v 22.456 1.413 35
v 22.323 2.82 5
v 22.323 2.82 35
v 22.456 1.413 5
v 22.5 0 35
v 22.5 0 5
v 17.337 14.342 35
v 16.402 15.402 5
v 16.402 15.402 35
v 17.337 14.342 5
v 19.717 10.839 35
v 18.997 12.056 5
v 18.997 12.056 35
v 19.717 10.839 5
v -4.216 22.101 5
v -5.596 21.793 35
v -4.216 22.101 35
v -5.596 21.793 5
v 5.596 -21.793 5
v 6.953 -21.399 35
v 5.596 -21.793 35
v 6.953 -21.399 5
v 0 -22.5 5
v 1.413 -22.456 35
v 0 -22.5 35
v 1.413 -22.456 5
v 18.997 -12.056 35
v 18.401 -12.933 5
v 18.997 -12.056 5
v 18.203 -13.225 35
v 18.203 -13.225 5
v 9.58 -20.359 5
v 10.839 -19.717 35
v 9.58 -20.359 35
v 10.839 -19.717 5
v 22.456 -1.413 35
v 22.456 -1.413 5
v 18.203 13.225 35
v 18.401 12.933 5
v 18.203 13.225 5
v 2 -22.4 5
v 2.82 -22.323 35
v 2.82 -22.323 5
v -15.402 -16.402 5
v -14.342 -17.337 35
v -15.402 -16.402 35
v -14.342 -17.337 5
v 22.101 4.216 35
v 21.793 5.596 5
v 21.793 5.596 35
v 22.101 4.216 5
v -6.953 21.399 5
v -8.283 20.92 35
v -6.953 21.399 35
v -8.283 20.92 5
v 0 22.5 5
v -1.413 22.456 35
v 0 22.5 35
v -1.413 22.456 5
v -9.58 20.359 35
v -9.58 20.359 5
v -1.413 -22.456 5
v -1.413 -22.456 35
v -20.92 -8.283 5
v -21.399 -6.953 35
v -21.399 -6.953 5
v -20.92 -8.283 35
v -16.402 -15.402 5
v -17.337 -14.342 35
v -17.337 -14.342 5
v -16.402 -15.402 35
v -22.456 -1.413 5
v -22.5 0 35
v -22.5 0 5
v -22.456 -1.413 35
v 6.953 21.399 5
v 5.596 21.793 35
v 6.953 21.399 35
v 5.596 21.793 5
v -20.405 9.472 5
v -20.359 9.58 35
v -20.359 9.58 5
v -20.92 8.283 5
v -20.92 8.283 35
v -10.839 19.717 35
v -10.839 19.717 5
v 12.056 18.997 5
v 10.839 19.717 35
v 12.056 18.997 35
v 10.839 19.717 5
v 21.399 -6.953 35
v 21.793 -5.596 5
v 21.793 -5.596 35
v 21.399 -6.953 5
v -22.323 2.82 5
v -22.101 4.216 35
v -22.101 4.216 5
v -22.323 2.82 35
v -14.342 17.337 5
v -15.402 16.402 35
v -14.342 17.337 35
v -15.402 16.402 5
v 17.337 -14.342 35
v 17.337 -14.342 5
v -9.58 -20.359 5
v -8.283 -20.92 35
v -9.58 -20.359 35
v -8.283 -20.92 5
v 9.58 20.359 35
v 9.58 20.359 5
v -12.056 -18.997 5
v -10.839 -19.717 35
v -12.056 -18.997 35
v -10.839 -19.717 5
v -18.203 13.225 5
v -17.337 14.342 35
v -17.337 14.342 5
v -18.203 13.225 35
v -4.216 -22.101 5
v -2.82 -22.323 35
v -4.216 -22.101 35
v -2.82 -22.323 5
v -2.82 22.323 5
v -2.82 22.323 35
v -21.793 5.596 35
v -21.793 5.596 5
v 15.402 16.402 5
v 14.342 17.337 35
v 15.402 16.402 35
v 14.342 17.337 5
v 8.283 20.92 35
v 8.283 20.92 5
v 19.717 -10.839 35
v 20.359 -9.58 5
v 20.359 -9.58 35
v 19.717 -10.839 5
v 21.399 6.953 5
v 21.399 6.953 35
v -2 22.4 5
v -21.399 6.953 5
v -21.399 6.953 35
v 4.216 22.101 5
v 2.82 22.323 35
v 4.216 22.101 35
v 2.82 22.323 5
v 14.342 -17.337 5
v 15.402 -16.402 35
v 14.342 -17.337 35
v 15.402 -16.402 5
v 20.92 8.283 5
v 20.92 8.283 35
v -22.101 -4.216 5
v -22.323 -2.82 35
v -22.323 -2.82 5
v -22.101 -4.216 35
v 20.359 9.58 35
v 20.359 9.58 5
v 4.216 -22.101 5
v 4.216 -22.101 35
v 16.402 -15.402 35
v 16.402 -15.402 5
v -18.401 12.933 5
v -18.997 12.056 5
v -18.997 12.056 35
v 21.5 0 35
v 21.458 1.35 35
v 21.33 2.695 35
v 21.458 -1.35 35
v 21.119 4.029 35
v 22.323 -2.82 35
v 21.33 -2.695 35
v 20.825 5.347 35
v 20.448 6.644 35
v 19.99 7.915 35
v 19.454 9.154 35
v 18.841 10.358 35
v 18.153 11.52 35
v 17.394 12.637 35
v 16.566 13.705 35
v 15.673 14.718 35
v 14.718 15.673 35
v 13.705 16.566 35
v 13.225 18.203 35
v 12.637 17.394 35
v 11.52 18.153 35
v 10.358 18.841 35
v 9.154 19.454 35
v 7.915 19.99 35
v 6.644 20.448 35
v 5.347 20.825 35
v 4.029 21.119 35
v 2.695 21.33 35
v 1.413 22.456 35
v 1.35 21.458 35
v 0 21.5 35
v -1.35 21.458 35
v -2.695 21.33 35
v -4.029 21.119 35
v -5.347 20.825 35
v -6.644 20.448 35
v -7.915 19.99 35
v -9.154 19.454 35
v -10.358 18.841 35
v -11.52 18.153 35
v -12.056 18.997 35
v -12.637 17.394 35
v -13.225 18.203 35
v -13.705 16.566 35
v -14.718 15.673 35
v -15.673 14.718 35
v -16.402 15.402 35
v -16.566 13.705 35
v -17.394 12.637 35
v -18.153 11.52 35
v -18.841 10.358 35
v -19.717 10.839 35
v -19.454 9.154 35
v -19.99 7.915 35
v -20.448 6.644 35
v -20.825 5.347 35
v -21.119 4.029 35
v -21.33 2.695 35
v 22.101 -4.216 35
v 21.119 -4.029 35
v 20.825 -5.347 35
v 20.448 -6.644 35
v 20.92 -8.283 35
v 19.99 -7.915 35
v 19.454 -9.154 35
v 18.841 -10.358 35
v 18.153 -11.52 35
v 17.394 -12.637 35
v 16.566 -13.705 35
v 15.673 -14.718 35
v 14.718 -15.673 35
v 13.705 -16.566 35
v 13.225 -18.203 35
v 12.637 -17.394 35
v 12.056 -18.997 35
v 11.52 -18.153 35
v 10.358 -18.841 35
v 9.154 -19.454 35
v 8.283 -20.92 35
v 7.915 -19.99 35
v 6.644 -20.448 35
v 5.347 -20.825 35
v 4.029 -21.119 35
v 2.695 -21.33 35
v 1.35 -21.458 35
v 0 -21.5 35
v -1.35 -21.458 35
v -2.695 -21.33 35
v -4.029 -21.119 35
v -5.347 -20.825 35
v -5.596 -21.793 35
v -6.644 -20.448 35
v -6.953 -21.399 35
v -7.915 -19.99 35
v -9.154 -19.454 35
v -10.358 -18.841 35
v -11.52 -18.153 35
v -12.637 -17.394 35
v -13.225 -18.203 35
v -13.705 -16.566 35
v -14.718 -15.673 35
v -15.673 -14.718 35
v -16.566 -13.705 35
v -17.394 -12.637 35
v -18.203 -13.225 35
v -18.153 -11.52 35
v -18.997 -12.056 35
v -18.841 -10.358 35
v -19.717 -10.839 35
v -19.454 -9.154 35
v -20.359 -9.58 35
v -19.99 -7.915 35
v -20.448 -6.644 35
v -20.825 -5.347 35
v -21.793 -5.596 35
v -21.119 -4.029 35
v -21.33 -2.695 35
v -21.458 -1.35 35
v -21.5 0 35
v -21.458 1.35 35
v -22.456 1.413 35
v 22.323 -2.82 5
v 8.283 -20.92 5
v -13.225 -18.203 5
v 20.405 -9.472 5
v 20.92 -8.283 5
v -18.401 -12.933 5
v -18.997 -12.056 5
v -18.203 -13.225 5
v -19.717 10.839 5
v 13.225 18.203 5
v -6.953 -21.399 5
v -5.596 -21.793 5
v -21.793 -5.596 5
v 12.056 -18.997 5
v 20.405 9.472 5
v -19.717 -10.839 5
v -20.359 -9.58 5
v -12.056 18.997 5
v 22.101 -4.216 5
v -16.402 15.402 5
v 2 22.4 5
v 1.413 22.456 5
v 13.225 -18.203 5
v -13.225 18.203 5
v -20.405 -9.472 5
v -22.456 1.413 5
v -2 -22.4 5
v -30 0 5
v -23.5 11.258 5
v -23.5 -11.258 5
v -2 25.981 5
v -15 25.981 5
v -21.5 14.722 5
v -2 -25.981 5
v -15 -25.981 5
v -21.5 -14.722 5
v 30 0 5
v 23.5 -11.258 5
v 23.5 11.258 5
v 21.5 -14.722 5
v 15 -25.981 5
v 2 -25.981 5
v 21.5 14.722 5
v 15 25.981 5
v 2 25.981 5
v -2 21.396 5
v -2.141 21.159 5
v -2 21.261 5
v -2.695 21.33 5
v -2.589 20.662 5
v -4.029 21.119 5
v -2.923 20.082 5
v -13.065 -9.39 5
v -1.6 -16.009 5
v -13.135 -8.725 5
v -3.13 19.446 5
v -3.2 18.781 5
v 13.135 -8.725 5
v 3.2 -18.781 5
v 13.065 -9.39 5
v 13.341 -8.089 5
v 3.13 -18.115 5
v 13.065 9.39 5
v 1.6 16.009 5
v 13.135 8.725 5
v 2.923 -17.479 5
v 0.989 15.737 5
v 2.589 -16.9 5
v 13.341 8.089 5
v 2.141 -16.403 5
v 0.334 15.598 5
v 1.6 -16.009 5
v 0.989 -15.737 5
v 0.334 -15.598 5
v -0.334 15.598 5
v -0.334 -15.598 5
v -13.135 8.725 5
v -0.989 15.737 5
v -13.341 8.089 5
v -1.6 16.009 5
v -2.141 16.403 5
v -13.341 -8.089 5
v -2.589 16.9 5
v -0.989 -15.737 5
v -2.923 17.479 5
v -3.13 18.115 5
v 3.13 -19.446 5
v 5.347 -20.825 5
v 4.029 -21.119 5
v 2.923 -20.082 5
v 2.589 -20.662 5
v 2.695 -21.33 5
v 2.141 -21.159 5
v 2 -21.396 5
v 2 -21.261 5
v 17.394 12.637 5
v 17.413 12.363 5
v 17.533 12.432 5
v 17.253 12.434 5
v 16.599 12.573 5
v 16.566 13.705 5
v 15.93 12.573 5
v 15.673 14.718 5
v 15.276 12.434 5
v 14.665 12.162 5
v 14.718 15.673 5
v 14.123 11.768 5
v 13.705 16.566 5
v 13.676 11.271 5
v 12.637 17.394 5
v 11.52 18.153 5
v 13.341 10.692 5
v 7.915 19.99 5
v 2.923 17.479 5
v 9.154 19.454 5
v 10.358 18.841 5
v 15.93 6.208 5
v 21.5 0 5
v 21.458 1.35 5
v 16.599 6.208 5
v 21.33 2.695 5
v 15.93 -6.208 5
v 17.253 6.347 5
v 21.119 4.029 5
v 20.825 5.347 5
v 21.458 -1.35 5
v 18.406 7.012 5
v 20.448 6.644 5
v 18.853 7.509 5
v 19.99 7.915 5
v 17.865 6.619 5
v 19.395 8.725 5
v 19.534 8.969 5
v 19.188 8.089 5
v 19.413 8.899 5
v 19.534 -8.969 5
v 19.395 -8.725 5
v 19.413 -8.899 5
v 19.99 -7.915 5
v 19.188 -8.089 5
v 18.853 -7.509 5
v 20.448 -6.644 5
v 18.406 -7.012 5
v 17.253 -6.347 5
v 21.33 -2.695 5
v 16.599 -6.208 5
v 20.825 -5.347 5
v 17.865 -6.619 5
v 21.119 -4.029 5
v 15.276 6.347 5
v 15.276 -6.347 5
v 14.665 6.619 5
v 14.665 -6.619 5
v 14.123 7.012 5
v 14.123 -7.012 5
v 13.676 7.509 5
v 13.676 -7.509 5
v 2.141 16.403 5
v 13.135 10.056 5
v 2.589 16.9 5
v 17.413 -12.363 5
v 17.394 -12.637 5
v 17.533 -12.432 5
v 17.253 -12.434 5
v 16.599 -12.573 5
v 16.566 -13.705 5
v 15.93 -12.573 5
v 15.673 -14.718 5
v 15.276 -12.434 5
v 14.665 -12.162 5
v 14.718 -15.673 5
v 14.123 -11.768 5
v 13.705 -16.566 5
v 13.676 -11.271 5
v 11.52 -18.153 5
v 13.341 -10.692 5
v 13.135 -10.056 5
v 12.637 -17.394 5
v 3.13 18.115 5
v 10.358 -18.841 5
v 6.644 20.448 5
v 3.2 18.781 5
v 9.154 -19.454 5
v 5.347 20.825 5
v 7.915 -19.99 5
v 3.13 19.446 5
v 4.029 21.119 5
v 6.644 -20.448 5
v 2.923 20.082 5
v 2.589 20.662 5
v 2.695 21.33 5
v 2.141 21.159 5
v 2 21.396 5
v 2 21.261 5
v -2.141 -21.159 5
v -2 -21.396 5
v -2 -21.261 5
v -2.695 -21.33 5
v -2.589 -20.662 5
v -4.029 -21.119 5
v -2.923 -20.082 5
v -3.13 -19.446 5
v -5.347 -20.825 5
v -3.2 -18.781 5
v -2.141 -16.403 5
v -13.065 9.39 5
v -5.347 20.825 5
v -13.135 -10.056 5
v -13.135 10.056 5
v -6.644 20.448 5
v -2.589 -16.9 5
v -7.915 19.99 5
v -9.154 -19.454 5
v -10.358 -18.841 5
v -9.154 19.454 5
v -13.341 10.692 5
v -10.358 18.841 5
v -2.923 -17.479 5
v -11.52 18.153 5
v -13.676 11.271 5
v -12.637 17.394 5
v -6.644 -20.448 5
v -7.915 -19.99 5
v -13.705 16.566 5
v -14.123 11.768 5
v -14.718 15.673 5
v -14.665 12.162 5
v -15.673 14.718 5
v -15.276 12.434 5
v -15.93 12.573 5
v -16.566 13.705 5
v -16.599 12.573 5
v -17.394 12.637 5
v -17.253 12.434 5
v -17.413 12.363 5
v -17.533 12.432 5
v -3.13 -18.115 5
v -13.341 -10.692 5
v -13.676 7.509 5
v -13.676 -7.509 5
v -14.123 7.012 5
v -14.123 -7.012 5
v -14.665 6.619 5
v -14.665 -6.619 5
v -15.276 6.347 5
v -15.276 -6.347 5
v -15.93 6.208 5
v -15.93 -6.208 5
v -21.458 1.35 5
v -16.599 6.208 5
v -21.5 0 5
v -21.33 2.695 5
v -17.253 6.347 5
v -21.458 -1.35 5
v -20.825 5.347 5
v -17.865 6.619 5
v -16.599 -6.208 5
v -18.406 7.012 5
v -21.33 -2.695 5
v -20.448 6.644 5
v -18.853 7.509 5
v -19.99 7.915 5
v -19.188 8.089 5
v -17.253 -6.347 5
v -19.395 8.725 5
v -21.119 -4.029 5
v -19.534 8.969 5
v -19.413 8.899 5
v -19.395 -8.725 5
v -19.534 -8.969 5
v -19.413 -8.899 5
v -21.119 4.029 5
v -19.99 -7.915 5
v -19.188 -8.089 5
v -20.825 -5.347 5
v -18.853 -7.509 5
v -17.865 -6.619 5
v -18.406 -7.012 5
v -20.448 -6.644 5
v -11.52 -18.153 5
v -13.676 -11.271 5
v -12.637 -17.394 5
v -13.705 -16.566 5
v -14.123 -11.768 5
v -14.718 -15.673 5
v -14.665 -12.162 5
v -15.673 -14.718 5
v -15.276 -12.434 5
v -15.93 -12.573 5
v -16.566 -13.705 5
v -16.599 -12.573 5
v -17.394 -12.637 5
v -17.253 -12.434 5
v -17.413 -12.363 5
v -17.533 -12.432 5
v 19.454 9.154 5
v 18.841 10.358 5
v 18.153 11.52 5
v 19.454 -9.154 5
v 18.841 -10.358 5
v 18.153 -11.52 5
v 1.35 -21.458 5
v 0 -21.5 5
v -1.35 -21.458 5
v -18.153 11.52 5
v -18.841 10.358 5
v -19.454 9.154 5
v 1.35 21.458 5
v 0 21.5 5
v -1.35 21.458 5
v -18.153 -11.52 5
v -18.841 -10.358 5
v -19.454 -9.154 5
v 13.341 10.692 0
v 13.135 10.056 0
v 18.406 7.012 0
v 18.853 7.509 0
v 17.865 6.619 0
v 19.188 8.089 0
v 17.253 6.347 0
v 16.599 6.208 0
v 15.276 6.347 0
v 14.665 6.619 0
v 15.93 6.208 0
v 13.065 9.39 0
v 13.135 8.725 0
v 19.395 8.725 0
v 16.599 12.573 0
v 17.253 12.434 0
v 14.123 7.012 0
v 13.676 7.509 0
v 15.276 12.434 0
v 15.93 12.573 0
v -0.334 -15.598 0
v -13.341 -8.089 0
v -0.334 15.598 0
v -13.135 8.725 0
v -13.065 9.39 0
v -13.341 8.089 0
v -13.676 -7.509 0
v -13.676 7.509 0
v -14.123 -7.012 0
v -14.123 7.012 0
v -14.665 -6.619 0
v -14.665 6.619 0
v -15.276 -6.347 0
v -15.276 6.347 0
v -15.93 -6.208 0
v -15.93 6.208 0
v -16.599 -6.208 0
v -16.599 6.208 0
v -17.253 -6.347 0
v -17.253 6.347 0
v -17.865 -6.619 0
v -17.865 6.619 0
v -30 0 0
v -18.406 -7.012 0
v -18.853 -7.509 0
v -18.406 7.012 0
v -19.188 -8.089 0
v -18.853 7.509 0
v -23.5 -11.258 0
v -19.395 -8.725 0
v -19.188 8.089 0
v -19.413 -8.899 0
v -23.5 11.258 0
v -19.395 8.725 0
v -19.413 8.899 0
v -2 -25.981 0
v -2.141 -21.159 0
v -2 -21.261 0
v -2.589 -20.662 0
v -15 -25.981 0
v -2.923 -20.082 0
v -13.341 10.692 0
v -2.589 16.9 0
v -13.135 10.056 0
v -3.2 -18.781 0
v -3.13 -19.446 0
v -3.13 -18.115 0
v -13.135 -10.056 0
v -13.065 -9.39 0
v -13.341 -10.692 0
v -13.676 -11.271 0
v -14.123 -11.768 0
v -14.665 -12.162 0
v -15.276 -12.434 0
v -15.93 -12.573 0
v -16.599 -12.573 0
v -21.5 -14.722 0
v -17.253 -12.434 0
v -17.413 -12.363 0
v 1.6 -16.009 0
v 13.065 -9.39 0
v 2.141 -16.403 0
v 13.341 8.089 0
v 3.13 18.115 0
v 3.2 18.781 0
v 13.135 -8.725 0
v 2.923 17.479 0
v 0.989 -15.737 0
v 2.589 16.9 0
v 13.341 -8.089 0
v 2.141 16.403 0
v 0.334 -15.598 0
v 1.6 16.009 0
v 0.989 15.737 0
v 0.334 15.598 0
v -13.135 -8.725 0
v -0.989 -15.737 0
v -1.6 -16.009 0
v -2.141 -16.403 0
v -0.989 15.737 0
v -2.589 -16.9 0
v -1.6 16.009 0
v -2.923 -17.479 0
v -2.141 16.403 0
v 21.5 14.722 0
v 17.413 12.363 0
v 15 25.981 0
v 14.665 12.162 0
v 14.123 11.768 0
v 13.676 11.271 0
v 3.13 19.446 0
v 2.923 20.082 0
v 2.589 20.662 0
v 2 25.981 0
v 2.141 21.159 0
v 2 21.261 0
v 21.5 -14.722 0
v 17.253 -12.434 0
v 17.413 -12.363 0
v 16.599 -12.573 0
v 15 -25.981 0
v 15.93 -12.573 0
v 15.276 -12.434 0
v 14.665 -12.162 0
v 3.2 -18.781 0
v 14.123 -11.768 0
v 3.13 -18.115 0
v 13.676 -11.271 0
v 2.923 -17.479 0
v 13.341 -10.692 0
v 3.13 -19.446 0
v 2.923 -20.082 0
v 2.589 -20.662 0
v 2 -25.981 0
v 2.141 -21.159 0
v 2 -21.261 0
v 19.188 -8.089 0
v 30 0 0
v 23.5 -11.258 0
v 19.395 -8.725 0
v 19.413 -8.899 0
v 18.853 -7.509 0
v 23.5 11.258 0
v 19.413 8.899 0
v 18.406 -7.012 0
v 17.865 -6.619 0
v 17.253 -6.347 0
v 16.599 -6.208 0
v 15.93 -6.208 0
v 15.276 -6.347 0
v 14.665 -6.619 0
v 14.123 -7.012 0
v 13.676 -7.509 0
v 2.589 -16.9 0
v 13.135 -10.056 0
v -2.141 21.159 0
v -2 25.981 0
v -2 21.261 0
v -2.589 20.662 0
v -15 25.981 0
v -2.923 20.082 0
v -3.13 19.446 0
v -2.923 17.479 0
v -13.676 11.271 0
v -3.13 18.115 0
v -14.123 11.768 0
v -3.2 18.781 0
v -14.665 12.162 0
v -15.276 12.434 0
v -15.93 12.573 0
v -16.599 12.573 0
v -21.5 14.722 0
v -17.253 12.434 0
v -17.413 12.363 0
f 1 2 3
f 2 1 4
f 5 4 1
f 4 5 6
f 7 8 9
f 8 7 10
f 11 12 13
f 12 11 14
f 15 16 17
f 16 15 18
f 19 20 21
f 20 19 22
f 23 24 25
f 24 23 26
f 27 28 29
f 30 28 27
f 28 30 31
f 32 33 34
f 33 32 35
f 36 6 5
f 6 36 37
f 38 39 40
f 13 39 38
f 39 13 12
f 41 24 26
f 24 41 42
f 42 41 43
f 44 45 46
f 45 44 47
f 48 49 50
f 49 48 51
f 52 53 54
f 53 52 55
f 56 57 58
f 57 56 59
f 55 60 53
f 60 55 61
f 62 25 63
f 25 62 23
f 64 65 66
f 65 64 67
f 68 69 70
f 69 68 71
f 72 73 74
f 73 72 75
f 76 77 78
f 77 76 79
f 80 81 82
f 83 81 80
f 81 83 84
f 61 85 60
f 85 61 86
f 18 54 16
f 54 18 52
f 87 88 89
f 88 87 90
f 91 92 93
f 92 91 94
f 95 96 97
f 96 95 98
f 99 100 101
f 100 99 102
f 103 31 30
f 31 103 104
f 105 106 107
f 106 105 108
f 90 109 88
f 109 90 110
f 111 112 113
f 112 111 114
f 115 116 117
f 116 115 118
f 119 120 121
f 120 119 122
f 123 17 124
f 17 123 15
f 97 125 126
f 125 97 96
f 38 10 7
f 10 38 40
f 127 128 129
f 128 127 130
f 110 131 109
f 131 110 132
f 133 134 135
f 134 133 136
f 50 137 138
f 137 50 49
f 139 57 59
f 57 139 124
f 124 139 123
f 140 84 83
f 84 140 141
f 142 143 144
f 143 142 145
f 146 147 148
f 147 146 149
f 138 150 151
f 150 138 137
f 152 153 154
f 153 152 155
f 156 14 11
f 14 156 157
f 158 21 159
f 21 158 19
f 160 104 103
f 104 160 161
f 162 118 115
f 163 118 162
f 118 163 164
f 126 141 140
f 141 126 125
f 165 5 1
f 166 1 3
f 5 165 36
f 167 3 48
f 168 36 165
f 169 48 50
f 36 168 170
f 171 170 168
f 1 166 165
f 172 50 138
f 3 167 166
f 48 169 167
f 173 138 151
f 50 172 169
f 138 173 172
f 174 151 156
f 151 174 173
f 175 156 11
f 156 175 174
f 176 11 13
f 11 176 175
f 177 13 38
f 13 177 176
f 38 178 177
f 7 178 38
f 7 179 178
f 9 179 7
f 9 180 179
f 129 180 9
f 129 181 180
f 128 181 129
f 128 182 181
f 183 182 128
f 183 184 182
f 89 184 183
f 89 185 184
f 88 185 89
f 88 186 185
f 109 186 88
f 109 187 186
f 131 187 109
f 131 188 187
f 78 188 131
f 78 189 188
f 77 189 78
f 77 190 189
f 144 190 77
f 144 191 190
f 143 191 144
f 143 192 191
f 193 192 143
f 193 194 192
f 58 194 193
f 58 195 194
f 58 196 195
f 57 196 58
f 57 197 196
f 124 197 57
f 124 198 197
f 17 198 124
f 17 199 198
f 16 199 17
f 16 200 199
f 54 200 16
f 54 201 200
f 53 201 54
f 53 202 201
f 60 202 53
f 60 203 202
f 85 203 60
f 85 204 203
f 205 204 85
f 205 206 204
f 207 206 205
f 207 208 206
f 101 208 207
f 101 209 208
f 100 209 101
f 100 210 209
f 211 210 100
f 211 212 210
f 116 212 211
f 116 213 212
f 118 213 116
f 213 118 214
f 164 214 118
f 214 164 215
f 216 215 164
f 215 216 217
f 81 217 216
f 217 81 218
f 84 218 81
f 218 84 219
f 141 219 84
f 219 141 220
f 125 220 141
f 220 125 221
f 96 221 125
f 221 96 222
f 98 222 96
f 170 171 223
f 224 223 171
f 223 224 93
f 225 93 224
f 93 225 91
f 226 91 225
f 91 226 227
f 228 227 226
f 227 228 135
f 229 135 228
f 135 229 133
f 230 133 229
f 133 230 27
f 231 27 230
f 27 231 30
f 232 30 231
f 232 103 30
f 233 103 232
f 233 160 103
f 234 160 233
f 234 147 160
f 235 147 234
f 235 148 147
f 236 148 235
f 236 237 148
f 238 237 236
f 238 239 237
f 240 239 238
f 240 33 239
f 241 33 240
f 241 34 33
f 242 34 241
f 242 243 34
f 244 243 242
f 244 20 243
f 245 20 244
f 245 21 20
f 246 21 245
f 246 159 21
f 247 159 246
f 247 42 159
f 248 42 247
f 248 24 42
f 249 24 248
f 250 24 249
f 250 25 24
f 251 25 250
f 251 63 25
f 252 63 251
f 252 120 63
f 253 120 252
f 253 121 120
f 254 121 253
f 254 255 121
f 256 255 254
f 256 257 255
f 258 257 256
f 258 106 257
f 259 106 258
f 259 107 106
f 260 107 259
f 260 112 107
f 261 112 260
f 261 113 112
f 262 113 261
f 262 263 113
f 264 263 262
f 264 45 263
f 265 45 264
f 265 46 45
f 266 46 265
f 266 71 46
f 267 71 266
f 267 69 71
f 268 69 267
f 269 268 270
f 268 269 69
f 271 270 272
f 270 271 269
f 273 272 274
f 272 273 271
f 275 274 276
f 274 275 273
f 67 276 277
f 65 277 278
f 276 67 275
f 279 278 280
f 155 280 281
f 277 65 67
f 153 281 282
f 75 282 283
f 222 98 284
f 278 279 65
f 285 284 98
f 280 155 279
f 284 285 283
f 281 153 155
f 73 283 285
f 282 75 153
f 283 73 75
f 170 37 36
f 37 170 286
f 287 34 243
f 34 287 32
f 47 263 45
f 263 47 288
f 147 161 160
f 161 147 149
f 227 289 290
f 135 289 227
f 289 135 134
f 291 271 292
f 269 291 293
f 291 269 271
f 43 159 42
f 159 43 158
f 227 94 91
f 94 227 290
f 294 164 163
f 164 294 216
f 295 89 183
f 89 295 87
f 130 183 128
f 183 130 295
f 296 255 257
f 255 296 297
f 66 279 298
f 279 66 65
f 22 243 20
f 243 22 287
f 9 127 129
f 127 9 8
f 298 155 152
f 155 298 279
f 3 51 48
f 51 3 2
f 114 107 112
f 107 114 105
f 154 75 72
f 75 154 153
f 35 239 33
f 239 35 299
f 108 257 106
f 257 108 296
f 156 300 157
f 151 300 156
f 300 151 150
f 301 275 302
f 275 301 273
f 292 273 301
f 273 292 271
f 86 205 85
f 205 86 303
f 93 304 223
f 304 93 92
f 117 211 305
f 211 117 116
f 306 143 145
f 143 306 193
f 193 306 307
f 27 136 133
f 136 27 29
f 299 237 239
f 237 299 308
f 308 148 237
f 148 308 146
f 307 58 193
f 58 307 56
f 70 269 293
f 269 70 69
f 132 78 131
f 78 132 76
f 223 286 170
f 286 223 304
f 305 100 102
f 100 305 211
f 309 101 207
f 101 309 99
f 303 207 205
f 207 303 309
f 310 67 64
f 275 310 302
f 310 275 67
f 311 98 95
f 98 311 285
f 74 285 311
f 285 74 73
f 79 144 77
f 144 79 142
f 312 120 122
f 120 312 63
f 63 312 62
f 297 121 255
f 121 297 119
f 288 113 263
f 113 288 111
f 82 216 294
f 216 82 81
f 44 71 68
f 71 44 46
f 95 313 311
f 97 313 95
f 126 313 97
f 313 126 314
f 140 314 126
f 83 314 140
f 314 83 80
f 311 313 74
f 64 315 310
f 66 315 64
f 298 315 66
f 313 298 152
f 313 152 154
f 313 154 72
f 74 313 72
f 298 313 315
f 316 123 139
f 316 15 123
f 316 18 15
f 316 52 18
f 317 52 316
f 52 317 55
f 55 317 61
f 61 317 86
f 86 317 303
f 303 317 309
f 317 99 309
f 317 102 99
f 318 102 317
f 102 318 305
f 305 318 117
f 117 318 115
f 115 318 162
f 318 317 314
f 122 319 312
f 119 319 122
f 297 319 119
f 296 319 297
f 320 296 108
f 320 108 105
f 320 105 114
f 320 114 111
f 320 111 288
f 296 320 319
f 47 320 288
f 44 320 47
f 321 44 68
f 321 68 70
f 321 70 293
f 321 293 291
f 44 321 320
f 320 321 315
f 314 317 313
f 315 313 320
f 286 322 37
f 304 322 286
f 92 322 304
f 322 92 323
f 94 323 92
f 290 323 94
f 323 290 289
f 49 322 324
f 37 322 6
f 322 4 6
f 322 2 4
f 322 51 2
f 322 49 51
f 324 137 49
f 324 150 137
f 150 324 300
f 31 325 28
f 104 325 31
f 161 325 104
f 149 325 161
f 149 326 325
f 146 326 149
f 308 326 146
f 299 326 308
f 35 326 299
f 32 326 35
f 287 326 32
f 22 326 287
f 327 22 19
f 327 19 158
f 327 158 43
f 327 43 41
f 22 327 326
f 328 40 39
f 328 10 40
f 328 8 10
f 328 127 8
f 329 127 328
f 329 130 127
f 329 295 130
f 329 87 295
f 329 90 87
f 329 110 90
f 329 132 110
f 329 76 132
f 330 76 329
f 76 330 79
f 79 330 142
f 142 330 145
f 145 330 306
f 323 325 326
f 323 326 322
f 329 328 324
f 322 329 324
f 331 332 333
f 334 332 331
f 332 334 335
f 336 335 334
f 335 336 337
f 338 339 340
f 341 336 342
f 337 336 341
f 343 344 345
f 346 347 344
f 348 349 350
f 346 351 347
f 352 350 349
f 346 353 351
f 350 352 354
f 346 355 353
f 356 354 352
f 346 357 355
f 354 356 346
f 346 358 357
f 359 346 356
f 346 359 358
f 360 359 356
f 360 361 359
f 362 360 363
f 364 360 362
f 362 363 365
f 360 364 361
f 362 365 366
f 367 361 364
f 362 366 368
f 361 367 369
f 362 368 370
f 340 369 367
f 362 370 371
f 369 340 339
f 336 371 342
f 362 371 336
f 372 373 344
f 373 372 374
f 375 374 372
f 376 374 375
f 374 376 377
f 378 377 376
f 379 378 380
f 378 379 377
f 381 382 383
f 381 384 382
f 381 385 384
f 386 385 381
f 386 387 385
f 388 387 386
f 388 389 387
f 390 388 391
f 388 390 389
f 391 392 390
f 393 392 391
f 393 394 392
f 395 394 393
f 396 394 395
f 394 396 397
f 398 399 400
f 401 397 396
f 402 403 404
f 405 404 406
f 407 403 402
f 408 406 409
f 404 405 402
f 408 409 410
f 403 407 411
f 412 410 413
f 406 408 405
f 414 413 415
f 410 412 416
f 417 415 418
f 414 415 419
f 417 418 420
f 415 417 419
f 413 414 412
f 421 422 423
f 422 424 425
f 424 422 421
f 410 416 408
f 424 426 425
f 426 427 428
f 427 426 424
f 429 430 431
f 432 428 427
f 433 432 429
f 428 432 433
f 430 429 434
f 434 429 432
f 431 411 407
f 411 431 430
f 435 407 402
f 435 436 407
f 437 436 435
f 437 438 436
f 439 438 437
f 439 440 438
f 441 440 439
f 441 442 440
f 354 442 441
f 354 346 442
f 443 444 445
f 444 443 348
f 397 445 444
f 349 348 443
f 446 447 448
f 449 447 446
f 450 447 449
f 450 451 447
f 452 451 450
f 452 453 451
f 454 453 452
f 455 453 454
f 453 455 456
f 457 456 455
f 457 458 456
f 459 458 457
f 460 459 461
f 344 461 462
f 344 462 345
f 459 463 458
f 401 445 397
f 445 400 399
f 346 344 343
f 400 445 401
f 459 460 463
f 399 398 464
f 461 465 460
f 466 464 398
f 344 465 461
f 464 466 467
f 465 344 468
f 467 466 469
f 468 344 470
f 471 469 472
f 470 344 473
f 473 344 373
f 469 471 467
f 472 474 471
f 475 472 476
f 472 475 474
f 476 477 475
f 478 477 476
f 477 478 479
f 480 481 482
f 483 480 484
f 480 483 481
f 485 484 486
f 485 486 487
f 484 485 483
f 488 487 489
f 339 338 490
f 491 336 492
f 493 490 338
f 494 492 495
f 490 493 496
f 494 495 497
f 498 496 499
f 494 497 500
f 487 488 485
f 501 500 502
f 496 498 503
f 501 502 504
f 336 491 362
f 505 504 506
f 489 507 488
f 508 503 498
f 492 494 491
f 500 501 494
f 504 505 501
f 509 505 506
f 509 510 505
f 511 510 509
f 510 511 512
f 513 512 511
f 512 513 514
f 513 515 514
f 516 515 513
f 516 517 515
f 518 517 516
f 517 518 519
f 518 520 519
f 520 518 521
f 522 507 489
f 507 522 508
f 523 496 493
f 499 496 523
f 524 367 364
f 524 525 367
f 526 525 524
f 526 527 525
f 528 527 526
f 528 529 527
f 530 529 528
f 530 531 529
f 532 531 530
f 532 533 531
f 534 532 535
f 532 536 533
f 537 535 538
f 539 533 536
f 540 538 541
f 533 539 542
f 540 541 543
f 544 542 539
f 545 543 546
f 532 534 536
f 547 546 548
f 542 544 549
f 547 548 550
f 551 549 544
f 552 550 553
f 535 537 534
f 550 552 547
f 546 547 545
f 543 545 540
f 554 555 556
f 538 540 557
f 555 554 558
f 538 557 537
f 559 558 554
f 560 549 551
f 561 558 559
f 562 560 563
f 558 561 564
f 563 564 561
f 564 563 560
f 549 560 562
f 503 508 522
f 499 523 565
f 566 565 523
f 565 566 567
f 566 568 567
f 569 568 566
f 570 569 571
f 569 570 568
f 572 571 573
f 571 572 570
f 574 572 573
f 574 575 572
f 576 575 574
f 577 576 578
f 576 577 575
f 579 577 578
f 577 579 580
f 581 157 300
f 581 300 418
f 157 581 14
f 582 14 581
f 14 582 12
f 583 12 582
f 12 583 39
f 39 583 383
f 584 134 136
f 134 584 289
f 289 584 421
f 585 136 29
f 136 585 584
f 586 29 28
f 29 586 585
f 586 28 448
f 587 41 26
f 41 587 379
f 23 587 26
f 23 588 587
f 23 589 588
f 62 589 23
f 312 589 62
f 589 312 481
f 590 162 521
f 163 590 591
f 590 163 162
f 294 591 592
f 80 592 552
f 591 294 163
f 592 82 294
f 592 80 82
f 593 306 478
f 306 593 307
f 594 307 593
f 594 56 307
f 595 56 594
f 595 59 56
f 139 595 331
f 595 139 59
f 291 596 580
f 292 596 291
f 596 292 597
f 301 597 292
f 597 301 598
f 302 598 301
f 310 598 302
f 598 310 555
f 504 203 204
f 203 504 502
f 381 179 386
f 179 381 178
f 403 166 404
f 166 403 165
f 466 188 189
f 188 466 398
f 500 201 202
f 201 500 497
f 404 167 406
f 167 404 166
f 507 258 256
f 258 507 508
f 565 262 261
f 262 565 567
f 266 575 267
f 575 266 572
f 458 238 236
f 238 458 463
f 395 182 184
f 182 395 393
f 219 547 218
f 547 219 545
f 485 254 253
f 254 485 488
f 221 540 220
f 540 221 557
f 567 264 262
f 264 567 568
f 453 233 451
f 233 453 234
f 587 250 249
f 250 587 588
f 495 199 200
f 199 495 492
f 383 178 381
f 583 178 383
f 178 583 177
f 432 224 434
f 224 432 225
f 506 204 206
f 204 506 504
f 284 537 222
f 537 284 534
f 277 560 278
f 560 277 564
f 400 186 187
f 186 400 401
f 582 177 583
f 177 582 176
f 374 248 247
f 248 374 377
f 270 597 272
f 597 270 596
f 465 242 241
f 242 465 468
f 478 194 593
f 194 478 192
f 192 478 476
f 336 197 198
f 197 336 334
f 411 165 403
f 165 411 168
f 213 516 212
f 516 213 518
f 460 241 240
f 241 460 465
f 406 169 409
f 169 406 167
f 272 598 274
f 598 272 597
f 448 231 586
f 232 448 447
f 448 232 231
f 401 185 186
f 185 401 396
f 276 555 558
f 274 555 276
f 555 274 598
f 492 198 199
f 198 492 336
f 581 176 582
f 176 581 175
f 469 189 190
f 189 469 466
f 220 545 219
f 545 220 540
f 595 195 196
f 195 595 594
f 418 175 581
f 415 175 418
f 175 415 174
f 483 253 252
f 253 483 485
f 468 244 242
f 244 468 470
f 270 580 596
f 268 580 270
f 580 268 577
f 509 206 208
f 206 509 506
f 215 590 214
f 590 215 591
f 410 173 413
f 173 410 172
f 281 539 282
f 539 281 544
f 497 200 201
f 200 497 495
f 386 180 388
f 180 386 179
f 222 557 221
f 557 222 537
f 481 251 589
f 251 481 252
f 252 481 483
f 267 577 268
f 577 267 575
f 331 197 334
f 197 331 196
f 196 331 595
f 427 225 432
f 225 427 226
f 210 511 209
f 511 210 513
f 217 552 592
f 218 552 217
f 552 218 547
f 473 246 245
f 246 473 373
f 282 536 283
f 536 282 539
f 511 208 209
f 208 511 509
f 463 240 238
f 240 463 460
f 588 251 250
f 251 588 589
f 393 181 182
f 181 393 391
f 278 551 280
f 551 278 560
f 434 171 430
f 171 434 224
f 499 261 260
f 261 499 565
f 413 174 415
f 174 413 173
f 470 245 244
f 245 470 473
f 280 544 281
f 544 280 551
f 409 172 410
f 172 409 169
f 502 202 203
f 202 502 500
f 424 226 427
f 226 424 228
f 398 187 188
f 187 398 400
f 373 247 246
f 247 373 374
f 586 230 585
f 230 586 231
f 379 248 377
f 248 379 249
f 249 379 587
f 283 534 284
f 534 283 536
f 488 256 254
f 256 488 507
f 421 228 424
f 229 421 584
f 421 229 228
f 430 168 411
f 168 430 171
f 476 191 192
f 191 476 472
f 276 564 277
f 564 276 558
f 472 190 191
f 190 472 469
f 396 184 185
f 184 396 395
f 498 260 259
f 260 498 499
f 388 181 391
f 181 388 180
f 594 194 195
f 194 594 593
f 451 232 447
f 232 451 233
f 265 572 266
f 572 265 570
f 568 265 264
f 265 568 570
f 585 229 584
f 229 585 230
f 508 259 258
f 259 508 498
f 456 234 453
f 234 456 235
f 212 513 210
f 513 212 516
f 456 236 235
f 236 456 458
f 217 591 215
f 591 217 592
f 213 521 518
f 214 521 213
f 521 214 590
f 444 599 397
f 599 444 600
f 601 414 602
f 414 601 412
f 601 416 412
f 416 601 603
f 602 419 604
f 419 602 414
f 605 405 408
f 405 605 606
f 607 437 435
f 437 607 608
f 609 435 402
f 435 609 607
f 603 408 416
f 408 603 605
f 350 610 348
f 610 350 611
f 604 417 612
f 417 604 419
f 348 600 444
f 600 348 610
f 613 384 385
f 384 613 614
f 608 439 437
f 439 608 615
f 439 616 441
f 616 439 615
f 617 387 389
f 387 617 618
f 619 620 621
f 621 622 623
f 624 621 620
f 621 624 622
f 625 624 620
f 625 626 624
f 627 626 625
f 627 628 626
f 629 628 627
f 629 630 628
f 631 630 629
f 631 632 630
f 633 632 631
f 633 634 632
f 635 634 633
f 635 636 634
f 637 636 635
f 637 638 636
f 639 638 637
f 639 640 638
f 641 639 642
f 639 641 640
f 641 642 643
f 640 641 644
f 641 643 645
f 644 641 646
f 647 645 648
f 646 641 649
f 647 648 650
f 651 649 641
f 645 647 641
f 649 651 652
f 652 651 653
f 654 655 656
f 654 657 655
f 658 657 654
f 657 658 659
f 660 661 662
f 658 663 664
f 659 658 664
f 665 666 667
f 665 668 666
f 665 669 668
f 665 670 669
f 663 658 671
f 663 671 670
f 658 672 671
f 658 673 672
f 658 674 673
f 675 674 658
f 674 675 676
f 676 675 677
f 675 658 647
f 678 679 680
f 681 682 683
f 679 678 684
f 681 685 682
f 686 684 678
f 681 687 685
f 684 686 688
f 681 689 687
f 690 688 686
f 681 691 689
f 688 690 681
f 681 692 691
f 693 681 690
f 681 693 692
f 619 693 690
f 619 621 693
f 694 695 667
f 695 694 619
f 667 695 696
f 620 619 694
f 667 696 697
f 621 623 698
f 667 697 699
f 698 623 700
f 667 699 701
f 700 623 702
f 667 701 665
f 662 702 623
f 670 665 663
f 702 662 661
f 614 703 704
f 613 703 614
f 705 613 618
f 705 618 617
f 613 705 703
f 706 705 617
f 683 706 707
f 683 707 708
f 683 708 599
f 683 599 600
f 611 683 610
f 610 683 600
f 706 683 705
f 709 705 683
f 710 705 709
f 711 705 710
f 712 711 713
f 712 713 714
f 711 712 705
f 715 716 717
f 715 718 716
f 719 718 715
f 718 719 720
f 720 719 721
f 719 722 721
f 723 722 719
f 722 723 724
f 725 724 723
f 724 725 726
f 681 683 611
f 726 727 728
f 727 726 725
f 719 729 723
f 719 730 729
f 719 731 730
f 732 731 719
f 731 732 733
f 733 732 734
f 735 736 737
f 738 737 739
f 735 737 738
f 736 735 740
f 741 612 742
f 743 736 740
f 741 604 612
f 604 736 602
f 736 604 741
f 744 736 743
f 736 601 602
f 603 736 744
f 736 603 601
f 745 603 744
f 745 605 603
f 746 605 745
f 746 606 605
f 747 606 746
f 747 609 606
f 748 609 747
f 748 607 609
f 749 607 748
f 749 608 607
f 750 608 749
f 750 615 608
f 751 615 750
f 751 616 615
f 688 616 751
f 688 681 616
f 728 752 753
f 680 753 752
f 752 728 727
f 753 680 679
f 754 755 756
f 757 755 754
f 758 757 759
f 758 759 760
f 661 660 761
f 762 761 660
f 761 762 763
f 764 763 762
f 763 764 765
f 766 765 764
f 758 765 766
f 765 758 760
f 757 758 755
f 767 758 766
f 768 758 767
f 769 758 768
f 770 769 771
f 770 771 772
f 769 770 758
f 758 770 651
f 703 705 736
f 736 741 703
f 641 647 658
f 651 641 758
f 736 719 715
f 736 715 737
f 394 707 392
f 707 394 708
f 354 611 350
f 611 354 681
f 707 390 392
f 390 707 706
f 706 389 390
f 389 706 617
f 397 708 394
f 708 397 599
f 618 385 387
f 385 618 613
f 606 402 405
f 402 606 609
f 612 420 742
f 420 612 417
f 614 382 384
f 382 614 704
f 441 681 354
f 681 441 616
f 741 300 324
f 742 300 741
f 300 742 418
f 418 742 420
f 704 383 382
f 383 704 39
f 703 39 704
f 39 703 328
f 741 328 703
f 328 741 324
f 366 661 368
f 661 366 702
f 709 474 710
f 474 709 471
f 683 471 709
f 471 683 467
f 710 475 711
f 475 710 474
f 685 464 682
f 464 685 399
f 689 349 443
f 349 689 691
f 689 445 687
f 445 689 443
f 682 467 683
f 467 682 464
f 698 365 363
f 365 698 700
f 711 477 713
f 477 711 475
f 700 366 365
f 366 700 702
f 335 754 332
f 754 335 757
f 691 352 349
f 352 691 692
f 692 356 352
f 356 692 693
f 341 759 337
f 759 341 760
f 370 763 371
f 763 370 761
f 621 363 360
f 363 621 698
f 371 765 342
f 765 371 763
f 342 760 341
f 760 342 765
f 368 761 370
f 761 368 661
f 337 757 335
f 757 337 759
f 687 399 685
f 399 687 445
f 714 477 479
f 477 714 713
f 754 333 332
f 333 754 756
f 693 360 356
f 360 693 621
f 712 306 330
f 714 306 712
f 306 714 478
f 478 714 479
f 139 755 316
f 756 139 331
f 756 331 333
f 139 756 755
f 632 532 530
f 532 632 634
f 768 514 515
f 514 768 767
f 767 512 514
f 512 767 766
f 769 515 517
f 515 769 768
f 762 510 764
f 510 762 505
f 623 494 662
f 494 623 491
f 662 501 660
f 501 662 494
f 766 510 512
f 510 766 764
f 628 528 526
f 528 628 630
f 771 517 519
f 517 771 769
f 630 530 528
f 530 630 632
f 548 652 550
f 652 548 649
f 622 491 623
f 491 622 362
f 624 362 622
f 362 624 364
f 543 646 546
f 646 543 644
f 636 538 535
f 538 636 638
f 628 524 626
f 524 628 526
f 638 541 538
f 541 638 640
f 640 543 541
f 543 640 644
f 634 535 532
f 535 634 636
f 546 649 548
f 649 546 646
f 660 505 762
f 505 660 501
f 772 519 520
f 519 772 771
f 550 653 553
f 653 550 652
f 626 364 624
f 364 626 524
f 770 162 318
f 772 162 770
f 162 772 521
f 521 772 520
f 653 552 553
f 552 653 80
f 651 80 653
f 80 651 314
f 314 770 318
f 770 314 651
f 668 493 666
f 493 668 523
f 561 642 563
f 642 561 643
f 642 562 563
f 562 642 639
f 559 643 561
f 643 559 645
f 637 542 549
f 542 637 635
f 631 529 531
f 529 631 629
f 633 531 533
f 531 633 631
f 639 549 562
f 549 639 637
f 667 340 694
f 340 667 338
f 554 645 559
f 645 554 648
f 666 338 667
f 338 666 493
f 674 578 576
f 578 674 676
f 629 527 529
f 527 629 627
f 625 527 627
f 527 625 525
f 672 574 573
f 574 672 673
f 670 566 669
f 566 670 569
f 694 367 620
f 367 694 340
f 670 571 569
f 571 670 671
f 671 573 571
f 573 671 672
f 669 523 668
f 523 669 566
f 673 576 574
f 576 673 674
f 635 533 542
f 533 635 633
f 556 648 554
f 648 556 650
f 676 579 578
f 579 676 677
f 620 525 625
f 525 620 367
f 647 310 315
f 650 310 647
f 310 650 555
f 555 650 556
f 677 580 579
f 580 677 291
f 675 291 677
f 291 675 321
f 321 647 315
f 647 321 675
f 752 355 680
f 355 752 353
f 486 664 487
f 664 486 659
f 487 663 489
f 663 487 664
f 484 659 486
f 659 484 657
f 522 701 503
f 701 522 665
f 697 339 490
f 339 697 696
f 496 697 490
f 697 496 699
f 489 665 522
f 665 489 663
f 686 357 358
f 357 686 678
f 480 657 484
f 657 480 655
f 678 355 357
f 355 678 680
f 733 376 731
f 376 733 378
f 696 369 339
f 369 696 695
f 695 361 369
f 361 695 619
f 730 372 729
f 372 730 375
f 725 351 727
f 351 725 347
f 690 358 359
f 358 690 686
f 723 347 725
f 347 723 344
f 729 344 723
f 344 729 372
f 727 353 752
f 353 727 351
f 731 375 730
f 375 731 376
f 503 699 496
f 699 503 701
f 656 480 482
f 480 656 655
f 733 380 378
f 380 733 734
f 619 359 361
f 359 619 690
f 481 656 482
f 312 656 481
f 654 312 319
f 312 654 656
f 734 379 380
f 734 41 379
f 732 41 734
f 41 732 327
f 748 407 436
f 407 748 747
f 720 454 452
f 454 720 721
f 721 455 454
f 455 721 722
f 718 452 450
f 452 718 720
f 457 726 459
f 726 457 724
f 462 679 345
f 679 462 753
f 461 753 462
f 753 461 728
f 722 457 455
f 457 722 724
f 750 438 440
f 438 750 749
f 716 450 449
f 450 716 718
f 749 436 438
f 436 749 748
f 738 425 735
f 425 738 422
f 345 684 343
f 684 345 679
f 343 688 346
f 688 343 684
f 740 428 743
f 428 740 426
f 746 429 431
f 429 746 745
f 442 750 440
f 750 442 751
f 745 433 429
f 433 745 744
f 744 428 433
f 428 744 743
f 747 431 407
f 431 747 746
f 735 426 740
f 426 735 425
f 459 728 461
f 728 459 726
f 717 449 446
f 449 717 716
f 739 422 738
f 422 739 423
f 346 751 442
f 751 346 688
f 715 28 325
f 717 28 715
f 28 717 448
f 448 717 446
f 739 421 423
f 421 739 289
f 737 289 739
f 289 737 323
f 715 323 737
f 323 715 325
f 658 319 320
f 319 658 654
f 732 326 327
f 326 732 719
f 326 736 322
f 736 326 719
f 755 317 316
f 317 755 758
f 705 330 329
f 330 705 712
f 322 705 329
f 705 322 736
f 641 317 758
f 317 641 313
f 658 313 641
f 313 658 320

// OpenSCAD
/**
@author: Jannetta S Steyn, Stuart M Lewis
@updated: 2021-01-15
@updated: 2021-01-14
@created: 2021-01-12

Honeycomb lock-in organiser
**/

// Switch on the bits you need rendered for export to STL
connector=false; // if true draw a connector
base=true; // if true draw the base
joint=false; // if true draw a joint (filler piece)
/*
Optionals:
0 = inner ring for paper towel cardboard tube
1 = large outer round rim
2 = large outer hexagonal rim
3 = outer ring for holding toilet roll tube
*/
optionals=[3]; // specify which optionals to draw

// Parameters
diameter=60; // Circumdiameter of hexagon
base_thickness=5; // Height of object (in z direction)
joint_tolerance=0.4; // Tolerance applied to holes
joint_radius=3; // Radius of joint circles
joint_diameter=joint_radius*2;
joint_width=(3/5)*joint_diameter; // Width of joint rect
joint_length=(6/5)*joint_diameter; // Height of joint rect

// Optional stuff




// Draw base
if (base) {
    for (x=optionals) {
            // Elevate to top level of base
        translate([0,0,base_thickness]) {
            if (x==0) {
                // Draw holder - cardboard tube inner
                // Draw small ring
                ring(22,2,25,100);
            }

            if (x==1) {
                // Draw holder - large ring
                //Draw big ring
                ring(50,2,25,100);
            }
            
            if (x==2) {
                // Draw hexagon holder
                ring(50,2,25,6);
            }
            if (x==3) {
                // Draw toilet roll tube holder
                ring(45,2,30,100);
            }
        }
    }
    difference() {
        honeycomb();
        
        ring_arrange(6,diameter/2,true)
            translate([-(6/5)*joint_diameter,0,0])
                rotate([0,0,-90])
                    joint(joint_width,joint_length,base_thickness,
                          joint_diameter,joint_tolerance);
    }
}


// Draw connector
if (connector) {
    translate([60,0,0]) {
        double_joint(joint_length*2)
            joint(joint_width,joint_length,base_thickness,
                  joint_diameter);
    }
}

// Draw a filler (half a connector)
if (joint) {
    translate([80,0,0]) {
           joint(joint_width,joint_length,base_thickness,
                  joint_diameter);
     }
}

// --
// Double joints fit in place (This can be commented out)
/*
ring_arrange(6,diameter/2,true)
    rotate([0,0,90])
        double_joint(joint_length*2)
            joint(joint_width,joint_length,base_thickness,
                  joint_diameter);
*/
// --

/**
* Base hexagon shape of the stand
**/
module honeycomb() {
    cylinder(d=diameter,h=base_thickness,$fn=6);
}

/**
* Shape of the key for the stand
* @param width [x] Width of the rectangle
* @param length [y] Length of the rectangle (originating from the center of the circle)
* @param thickness [z] Height of the shape
* @param diameter Diameter of the circle
* @param tolerance Additional thickness to be added (for cutouts)
**/
module joint(width,length,thickness,diameter=5,tolerance=0) {
    cylinder(d=diameter+tolerance,
             h=thickness, $fn=30);
    translate([-width/2-tolerance/2,0,0])
        cube([width+tolerance,
              length,
              thickness]);
}

/**
* Create two mirrored children
* @param distance [y] Distance between centers of the children
**/
module double_joint(distance) {
    translate([0,-distance/2,0])
        children();
    translate([0,distance/2,0])
        rotate([0,0,180])
            children();
}

/**
* Arrange children along points on a polygon
* @param n Number of points (i.e. polygon sides)
* @param distance [x] Radius of the circle to plot on
* @param on_apothem If true, position children on the center of each face of the polygon, else position them on the vertices
**/
module ring_arrange(n,distance,on_apothem) {
    r=on_apothem ? 180/n : 0;
    d=on_apothem ? distance*cos(180/n) : n;
    
    rotate([0,0,r])
        for (i = [0:n])
            rotate([0,0,360*i/n])
                translate([d,0,0])
                    children();
}

/**
* Rings on base 
* @param outer diameter of ring
* @param thickness of diameter ring
* @param height of ring
**/
module ring(outer_diameter, thickness, height, faces) {
    difference() {
        cylinder(d=outer_diameter,h=height,center=false,$fn=faces);
        cylinder(d=outer_diameter-thickness,h=height,center=false,$fn=faces);
    }
}
